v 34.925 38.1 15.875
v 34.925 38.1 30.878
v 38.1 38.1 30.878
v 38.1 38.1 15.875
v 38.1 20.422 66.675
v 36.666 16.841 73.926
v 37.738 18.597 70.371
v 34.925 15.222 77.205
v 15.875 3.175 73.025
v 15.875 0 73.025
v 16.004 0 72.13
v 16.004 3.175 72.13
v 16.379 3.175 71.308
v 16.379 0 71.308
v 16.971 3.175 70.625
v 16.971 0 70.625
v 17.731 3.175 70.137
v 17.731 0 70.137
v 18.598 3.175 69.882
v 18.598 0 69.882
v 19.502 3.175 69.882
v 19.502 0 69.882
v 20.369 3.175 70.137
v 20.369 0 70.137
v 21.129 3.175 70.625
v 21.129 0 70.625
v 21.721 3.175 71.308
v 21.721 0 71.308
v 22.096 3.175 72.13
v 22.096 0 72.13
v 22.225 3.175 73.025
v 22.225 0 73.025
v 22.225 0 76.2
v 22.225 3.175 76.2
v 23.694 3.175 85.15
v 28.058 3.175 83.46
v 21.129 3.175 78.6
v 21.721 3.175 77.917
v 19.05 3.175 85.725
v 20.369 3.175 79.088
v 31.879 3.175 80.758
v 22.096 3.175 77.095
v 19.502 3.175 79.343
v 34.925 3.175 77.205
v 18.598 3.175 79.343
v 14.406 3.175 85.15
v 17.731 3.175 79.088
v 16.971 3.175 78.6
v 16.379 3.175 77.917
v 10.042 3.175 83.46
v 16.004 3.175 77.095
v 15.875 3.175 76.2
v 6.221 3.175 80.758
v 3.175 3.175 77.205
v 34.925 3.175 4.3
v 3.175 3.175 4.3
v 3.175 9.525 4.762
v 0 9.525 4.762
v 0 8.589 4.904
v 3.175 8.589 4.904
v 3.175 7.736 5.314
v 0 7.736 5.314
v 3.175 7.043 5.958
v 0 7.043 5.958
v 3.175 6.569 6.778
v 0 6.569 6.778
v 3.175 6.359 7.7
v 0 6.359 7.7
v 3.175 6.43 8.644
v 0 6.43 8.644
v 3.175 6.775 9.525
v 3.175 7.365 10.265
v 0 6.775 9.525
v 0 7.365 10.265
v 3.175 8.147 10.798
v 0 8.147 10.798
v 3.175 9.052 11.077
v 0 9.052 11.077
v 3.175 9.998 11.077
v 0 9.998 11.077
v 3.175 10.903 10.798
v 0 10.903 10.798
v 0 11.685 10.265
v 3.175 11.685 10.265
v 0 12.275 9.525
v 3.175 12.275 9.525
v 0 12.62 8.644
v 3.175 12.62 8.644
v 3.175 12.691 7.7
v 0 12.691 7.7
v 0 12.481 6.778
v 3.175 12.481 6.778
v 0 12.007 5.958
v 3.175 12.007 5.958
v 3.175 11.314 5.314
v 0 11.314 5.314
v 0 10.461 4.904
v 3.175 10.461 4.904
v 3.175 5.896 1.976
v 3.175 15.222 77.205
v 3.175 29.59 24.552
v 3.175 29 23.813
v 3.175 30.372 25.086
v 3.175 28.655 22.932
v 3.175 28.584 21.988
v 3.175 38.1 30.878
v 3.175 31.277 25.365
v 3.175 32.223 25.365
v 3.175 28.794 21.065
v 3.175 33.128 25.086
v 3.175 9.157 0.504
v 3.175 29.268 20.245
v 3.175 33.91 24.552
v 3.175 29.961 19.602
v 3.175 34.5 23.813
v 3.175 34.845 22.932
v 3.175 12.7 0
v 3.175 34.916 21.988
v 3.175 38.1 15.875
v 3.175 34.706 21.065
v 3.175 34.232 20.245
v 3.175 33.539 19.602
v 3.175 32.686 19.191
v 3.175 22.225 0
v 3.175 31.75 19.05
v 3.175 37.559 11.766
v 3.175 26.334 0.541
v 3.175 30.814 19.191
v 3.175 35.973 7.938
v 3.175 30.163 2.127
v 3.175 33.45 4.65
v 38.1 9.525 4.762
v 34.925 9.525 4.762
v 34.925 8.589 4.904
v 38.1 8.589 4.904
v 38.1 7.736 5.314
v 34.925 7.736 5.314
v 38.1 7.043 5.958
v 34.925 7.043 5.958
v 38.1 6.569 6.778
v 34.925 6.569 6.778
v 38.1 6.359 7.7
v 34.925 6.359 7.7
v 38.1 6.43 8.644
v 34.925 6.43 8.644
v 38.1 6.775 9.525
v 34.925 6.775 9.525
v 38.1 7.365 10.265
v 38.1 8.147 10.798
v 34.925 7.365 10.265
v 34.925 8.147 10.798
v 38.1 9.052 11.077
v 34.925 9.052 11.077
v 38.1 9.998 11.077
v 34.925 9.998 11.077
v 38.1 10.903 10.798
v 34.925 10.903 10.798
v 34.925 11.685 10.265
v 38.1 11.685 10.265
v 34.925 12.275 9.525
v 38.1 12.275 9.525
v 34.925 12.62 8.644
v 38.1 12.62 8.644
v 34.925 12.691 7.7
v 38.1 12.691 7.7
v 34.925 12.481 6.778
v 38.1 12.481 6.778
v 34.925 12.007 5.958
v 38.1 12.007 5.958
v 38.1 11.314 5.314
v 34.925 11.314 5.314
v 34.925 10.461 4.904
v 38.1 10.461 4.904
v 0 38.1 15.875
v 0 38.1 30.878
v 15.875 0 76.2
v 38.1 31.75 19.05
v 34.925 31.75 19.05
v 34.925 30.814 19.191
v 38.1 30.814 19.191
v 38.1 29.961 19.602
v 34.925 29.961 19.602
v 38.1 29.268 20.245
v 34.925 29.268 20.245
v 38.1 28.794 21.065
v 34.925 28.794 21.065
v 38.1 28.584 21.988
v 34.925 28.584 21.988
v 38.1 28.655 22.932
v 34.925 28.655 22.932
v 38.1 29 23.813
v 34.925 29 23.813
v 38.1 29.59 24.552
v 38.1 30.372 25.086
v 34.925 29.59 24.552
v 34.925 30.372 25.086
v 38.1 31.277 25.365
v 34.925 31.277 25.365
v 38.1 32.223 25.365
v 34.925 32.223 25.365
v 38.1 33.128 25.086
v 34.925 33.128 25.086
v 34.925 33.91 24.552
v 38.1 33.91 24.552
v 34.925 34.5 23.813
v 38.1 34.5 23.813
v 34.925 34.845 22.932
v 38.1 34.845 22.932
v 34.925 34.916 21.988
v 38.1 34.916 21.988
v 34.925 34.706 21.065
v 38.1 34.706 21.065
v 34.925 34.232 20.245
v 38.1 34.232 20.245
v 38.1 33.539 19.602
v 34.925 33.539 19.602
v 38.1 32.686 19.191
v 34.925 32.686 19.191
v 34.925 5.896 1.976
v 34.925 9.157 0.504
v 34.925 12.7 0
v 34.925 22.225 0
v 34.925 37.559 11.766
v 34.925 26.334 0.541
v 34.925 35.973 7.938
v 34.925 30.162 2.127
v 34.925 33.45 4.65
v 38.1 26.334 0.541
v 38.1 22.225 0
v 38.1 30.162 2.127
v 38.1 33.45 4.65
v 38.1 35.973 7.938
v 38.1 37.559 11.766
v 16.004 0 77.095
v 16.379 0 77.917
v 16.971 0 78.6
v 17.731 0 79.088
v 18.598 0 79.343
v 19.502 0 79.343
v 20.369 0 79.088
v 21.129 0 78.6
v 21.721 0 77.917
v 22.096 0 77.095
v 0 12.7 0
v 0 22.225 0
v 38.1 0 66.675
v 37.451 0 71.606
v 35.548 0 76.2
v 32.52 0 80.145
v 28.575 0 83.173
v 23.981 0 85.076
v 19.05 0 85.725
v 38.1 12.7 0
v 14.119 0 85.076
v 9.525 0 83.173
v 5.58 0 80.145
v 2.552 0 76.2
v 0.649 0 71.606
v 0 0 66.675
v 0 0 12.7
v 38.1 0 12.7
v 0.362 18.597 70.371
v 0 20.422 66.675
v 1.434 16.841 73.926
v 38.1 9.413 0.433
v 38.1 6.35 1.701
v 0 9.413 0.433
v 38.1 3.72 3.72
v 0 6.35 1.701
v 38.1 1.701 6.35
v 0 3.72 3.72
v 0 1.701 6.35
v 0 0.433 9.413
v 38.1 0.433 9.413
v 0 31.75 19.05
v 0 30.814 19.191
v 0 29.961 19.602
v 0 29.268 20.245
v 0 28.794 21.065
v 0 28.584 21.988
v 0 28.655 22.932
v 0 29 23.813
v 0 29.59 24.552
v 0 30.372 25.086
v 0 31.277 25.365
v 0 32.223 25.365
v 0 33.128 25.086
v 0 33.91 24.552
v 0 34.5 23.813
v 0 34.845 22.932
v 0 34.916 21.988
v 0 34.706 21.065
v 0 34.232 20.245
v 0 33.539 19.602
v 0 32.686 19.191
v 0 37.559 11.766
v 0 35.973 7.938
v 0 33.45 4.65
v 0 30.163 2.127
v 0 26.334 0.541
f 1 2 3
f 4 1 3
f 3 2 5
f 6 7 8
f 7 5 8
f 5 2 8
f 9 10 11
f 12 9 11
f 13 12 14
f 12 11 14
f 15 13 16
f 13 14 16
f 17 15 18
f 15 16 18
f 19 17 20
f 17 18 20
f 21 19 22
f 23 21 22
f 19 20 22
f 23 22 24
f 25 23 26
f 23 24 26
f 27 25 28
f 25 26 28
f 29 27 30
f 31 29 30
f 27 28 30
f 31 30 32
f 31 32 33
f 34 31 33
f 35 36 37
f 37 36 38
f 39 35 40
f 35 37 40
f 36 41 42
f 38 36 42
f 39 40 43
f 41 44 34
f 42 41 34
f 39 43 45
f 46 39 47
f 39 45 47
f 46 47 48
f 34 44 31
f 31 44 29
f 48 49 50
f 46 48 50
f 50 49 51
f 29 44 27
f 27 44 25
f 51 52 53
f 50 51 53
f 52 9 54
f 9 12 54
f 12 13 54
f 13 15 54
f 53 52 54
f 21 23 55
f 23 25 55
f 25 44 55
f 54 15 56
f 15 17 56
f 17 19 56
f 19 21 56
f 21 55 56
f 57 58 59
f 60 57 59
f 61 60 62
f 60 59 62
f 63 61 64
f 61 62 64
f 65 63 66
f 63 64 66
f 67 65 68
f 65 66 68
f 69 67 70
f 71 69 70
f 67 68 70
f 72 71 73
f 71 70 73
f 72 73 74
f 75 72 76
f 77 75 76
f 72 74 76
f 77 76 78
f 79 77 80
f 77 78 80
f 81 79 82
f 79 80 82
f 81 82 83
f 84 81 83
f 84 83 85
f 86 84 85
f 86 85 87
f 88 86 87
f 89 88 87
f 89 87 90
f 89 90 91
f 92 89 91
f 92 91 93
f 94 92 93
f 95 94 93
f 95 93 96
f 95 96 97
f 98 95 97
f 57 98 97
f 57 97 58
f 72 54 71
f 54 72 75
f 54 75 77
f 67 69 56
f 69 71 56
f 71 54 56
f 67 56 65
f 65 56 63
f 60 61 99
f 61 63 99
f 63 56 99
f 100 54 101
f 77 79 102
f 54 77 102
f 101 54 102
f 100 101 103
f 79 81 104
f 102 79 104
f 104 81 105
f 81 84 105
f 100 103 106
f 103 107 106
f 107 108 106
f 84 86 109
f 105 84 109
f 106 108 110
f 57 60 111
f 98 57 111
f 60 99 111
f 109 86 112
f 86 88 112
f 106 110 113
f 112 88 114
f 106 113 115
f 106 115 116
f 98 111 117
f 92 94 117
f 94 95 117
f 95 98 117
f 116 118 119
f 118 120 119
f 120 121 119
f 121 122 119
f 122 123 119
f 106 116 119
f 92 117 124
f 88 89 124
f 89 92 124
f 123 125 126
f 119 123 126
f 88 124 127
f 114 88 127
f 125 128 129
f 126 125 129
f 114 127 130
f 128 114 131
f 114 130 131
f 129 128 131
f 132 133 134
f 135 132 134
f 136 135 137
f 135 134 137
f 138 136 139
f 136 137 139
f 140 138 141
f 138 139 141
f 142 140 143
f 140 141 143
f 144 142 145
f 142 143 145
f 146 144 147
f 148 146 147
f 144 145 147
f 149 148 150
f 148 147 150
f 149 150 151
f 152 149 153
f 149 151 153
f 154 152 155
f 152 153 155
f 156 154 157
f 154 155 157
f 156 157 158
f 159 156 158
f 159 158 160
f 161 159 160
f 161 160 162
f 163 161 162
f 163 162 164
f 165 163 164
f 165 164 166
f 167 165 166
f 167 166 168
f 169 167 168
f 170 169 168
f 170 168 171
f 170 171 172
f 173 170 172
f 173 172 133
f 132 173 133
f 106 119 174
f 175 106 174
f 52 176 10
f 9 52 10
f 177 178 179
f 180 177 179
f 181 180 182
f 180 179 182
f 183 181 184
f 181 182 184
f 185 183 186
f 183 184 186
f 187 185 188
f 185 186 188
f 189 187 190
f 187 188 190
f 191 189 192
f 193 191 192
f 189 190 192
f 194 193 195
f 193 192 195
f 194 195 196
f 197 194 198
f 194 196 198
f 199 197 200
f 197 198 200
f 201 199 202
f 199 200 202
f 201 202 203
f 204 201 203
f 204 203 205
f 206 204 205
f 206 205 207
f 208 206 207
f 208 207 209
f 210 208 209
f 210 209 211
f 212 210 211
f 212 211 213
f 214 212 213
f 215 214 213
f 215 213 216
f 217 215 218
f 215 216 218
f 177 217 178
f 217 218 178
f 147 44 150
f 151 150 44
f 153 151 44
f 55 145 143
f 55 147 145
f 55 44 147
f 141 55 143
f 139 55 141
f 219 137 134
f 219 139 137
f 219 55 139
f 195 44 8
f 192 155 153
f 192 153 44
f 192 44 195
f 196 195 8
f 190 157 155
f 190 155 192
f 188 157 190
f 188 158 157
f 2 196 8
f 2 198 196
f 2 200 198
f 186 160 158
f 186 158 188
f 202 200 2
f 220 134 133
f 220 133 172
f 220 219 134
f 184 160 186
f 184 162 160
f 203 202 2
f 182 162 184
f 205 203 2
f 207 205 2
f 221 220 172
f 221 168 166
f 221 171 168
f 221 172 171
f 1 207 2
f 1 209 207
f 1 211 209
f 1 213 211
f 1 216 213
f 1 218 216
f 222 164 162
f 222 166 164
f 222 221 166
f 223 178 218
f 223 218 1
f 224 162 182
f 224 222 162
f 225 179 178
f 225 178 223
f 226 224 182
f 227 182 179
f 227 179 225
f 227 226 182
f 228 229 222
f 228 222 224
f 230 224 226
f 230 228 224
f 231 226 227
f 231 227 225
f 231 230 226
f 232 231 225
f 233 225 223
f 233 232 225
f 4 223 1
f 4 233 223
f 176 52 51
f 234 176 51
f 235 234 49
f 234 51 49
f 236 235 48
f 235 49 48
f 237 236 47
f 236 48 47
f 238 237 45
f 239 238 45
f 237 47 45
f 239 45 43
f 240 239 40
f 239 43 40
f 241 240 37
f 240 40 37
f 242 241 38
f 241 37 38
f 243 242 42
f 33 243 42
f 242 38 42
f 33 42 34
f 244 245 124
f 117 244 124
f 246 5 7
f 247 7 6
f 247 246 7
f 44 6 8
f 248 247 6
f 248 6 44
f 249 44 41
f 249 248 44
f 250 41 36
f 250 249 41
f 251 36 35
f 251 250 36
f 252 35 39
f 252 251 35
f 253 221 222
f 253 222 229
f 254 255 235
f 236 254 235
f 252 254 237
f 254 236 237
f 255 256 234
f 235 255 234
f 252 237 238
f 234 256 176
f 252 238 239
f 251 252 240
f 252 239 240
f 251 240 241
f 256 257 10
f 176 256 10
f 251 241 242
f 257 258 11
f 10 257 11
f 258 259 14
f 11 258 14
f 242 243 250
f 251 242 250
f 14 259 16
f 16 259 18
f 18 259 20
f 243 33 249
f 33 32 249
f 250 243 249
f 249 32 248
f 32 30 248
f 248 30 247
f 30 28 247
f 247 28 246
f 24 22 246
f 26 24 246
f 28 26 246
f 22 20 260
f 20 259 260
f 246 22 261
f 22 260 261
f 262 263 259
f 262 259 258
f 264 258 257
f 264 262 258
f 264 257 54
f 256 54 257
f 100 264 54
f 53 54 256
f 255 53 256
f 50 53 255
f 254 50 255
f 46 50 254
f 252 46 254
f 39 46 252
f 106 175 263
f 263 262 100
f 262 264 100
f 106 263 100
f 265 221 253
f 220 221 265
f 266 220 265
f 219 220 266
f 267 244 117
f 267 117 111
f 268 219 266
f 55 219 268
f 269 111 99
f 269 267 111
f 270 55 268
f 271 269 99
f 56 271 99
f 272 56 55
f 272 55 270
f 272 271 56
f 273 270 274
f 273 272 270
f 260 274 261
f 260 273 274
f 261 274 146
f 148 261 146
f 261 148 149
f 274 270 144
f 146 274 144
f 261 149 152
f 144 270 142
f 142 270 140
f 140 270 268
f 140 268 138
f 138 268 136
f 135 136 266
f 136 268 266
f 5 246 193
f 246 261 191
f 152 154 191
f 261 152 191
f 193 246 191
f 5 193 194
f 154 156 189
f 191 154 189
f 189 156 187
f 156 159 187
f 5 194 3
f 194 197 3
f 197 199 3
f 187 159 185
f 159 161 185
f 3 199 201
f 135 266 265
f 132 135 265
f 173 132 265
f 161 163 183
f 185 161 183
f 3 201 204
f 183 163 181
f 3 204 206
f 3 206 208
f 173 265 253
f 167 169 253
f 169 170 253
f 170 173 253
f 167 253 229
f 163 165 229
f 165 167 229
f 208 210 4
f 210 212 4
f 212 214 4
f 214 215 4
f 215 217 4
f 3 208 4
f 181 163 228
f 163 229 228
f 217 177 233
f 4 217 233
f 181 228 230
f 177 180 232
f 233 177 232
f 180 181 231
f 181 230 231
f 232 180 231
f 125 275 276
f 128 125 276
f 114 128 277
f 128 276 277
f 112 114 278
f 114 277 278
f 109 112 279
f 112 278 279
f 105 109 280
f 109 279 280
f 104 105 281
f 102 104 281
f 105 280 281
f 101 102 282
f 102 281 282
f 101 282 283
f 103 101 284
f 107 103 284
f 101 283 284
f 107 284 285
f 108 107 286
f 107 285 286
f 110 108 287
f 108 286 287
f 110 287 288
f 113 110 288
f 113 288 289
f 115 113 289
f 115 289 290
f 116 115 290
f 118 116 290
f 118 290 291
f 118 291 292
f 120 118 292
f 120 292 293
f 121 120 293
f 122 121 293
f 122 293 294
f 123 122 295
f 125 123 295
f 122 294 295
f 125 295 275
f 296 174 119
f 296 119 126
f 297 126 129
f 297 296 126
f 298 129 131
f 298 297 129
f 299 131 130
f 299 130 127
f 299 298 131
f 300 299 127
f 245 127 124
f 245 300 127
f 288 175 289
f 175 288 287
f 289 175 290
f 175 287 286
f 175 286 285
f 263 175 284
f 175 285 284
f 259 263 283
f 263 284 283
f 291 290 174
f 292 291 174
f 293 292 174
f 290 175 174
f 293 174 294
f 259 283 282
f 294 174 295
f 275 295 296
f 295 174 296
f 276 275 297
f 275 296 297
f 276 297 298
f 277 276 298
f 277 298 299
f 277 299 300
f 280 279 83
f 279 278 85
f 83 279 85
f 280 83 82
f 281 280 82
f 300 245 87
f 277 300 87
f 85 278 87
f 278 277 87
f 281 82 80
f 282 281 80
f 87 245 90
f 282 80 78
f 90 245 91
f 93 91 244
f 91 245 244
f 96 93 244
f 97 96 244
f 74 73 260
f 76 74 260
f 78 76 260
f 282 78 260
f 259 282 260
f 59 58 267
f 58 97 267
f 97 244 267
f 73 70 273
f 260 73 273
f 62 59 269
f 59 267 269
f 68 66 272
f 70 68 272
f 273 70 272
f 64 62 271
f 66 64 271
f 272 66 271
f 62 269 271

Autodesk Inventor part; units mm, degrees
ref_plane "YZ Plane" through (0, 0, 0) normal (1, 0, 0) x (0, 1, 0)
ref_plane "XZ Plane" through (0, 0, 0) normal (0, 1, 0) x (-1, 0, 0)
ref_plane "XY Plane" through (0, 0, 0) normal (0, 0, 1) x (1, 0, 0)
sketch "Sketch1" plane through (0, 0, 0) normal (0, 0, 1) x (1, 0, 0)
  line L0 (0, 0) -> (3.175, 0)
  line L1 (3.175, 0) -> (3.175, 38.1)
  line L2 (3.175, 38.1) -> (0, 38.1)
  line L3 (0, 38.1) -> (0, 0)
  line L4 (0, 0) -> (38.1, 0)
  line L5 (38.1, 0) -> (38.1, 3.175)
  line L6 (38.1, 3.175) -> (0, 3.175)
  line L7 (0, 3.175) -> (0, 0)
  line L8 (38.1, 0) -> (34.925, 0)
  line L9 (34.925, 0) -> (34.925, 38.1)
  line L10 (34.925, 38.1) -> (38.1, 38.1)
  line L11 (38.1, 38.1) -> (38.1, 0)
  dimension "d0" = 3.175
  dimension "d1" = 38.1
  dimension "d2" = 38.1
  dimension "d3" = 3.175
  dimension "d4" = 3.175
  dimension "d5" = 38.1
extrude "Extrusion1" add sketch "Sketch1" along normal blind 101.6
sketch "Sketch2" plane through (38.1, 0, 0) normal (1, 0, 0) x (0, 0, -1)
  line L0 (-101.6, 3.175) -> (0, 3.175) projected
  line L1 (0, 0) -> (0, 38.1) projected
  point P0 (-7.9375, 9.525)
  dimension "d8" = 6.35
  dimension "d9" = 7.9375
hole "Hole1" at (38.1, 9.525, 7.9375) direction (-1, 0, 0) diameter 6.35 end through all
sketch "Sketch3" plane through (38.1, 0, 0) normal (1, 0, 0) x (0, 0, -1)
  line L0 (0, 38.1) -> (-101.6, 38.1) projected
  line L1 (0, 0) -> (0, 38.1) projected
  point P0 (-22.225, 31.75)
  dimension "d17" = 6.35
  dimension "d18" = 22.225
hole "Hole2" at (38.1, 31.75, 22.225) direction (-1, 0, 0) diameter 6.35 end through all
ref_plane "Work Plane1" through (19.05, 3.175, 0) normal (-1, 0, 0) x (0, 0, 1)
fillet "Fillet1" radius 12.7 1 edges at (19.05, 0, 0)
sketch "Sketch4" plane through (0, 0, 101.6) normal (-1, 0, 0) x (0, 0, 1)
  line L0 (-78.4449, 41.9138) -> (31.1063, -12.1864)
  line L1 (31.1063, -12.1864) -> (58.2522, 42.7832)
  line L2 (58.2522, 42.7832) -> (-51.299, 96.8833)
  line L3 (-51.299, 96.8833) -> (-78.4449, 41.9138)
  arc A0 (-101.6, 12.7) -> (-88.9, 0) centre (-88.9, 12.7) ccw projected
  line L4 (-88.9, 0) -> (0, 0) projected
  line L5 (0, 38.1) -> (0, 0) projected
  line L6 (-101.6, 38.1) -> (0, 38.1) projected
  line L7 (-101.6, 38.1) -> (-101.6, 12.7) projected
  circle A1 centre (-79.375, 31.75) radius 3.175 projected
  circle A2 centre (-93.6625, 9.525) radius 3.175 projected
  line L8 (-97.3003, 3.175) -> (0, 3.175) projected
  point P0 (-101.6, 0)
  dimension "d27" = 9.525
  dimension "d28" = 6.35
extrude "Extrusion2" cut sketch "Sketch4" against normal through all contours L5 L6 L0 L3 L2 L1 | L0 L6 L5
fillet "Fillet2" radius 15.875 2 edges at (1.5875, 38.1, 0) (36.5125, 38.1, 0)
sketch "Sketch5" plane through (0, 0, 101.6) normal (0, -1, 0) x (1, 0, 0)
  line L0 (0, -88.9) -> (0, 0) projected
  point P0 (0, -101.6)
  point P1 (19.05, -25.4)
  dimension "d32" = 19.05
  dimension "d40" = 76.2
hole "Hole3" at (19.05, 0, 76.2) direction (0, 1, 0) diameter 6.35 end through all
sketch "Sketch6" plane through (0, 0, 101.6) normal (0, -1, 0) x (1, 0, 0)
  circle A0 centre (19.05, -25.4) radius 3.175
  circle A1 centre (19.05, -25.4) radius 3.175 projected
  line L0 (38.1, -88.9) -> (0, -88.9) projected
  line L1 (38.1, -88.9) -> (38.1, 0) projected
  line L2 (0, 0) -> (38.1, 0) projected
  line L3 (0, -88.9) -> (0, 0) projected
  line L4 (-11.1164, -15.875) -> (47.1756, -15.875)
  line L5 (47.1756, -15.875) -> (47.1756, 8.1032)
  line L6 (47.1756, 8.1032) -> (-11.1164, 8.1032)
  line L7 (-11.1164, 8.1032) -> (-11.1164, -15.875)
  point P0 (0, -101.6)
  dimension "d41" = 9.525
  dimension "d42" = 6.35
extrude "Extrusion3" cut sketch "Sketch6" against normal through all contours L4 L3 L2 L1 | L1 L2 L3 L4 L7 L6 L5
fillet "Fillet3" radius 19.05 2 edges at (0, 5.5073, 85.725) (38.1, 5.5073, 85.725)
sketch "Sketch7" plane through (0, 0, 12.7) normal (0, -1, 0) x (1, 0, 0)
  circle A0 centre (19.05, 63.5) radius 3.175 projected
  line L0 (19.05, 63.5) -> (19.05, 60.325) construction
  line L1 (15.875, 63.5) -> (15.875, 60.325)
  line L2 (22.225, 60.325) -> (22.225, 63.5)
  arc A1 (22.225, 63.5) -> (15.875, 63.5) centre (19.05, 63.5) ccw
  arc A2 (15.875, 60.325) -> (22.225, 60.325) centre (19.05, 60.325) ccw
  point P0 (0, -12.7)
  point P1 (19.05, 61.9125)
  dimension "d46" = 3.175
extrude "Extrusion4" cut sketch "Sketch7" against normal blind 25.4 contours L2 A2 L1 A0
properties part number "CAR_048_NewCarouselTensioner1.5UChannel" material "Aluminum 6061"
